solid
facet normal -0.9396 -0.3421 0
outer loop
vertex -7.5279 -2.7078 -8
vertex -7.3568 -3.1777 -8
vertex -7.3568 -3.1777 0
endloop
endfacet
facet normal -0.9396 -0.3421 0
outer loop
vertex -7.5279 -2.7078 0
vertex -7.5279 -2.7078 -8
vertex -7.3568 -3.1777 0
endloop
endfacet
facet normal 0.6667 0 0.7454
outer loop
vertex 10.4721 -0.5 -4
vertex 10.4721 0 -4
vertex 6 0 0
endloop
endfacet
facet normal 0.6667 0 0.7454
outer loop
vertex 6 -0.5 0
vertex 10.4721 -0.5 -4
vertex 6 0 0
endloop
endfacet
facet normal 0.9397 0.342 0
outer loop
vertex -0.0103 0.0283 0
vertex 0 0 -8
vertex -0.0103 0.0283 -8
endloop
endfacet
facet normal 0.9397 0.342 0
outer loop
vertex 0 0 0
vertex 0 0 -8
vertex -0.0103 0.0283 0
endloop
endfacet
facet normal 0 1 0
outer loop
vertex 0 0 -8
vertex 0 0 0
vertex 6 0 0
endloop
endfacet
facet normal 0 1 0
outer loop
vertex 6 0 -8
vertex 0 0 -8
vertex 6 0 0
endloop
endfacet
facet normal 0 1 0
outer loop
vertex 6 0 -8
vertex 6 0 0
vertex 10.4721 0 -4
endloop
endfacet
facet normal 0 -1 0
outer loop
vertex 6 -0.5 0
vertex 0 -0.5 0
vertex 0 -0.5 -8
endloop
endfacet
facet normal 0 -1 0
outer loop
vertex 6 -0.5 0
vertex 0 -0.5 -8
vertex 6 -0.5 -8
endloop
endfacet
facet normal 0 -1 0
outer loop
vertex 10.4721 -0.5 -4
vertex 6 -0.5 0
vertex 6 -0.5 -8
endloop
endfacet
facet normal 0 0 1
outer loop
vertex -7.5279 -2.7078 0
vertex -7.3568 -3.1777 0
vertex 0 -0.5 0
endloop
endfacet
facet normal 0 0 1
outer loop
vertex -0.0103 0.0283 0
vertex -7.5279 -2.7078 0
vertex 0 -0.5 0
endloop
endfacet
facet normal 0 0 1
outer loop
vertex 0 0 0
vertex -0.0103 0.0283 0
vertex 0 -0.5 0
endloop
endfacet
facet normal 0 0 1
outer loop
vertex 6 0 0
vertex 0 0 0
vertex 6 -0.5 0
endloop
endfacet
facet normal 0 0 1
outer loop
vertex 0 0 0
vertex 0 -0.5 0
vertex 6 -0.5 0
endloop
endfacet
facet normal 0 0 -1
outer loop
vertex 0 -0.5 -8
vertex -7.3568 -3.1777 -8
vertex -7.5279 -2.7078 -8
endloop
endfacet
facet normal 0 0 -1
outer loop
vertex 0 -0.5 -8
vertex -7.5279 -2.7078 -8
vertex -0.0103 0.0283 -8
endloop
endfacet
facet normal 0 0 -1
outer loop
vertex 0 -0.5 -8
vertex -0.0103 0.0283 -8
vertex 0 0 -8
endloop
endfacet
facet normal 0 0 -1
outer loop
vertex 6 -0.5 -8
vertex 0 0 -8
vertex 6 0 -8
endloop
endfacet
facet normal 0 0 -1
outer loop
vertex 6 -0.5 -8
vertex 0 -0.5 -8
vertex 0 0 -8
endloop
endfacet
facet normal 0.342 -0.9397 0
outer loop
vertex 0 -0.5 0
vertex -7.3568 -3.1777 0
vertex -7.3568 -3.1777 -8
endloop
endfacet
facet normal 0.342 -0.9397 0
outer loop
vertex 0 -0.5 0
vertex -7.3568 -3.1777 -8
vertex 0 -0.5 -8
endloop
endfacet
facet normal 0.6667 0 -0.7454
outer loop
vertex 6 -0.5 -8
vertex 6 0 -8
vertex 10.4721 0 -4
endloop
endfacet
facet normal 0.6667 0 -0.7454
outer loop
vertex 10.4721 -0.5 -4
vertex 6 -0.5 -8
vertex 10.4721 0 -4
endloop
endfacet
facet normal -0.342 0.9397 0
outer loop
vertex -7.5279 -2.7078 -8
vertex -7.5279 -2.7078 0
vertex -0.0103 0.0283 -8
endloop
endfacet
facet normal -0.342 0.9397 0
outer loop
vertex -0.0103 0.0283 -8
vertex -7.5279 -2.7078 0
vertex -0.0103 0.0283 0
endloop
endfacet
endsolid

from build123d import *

# Parameters (mm, degrees)
F1_DEPTH = 0.5
F3_W     = 8
F3_H     = 8
F4_DEPTH = 0.5


with BuildPart() as f1:
    # F0 (on Front) → F1 (new body)
    with BuildSketch(Plane.XZ):
        Polygon((6, 0), (0, 0), (0, -8), (6, -8), (10.472136, -4), align=None)
    extrude(amount=F1_DEPTH)

    # F3 (on face) → F4 (join)
    with BuildSketch(Plane(origin=(0.160697, -0.441511, 0), x_dir=(0.939693, 0.34202, 0), z_dir=(0.34202, -0.939693, 0))):
        with Locations((-4, -4)):
            Rectangle(F3_W, F3_H)
    extrude(amount=-F4_DEPTH)


solid = f1.part
